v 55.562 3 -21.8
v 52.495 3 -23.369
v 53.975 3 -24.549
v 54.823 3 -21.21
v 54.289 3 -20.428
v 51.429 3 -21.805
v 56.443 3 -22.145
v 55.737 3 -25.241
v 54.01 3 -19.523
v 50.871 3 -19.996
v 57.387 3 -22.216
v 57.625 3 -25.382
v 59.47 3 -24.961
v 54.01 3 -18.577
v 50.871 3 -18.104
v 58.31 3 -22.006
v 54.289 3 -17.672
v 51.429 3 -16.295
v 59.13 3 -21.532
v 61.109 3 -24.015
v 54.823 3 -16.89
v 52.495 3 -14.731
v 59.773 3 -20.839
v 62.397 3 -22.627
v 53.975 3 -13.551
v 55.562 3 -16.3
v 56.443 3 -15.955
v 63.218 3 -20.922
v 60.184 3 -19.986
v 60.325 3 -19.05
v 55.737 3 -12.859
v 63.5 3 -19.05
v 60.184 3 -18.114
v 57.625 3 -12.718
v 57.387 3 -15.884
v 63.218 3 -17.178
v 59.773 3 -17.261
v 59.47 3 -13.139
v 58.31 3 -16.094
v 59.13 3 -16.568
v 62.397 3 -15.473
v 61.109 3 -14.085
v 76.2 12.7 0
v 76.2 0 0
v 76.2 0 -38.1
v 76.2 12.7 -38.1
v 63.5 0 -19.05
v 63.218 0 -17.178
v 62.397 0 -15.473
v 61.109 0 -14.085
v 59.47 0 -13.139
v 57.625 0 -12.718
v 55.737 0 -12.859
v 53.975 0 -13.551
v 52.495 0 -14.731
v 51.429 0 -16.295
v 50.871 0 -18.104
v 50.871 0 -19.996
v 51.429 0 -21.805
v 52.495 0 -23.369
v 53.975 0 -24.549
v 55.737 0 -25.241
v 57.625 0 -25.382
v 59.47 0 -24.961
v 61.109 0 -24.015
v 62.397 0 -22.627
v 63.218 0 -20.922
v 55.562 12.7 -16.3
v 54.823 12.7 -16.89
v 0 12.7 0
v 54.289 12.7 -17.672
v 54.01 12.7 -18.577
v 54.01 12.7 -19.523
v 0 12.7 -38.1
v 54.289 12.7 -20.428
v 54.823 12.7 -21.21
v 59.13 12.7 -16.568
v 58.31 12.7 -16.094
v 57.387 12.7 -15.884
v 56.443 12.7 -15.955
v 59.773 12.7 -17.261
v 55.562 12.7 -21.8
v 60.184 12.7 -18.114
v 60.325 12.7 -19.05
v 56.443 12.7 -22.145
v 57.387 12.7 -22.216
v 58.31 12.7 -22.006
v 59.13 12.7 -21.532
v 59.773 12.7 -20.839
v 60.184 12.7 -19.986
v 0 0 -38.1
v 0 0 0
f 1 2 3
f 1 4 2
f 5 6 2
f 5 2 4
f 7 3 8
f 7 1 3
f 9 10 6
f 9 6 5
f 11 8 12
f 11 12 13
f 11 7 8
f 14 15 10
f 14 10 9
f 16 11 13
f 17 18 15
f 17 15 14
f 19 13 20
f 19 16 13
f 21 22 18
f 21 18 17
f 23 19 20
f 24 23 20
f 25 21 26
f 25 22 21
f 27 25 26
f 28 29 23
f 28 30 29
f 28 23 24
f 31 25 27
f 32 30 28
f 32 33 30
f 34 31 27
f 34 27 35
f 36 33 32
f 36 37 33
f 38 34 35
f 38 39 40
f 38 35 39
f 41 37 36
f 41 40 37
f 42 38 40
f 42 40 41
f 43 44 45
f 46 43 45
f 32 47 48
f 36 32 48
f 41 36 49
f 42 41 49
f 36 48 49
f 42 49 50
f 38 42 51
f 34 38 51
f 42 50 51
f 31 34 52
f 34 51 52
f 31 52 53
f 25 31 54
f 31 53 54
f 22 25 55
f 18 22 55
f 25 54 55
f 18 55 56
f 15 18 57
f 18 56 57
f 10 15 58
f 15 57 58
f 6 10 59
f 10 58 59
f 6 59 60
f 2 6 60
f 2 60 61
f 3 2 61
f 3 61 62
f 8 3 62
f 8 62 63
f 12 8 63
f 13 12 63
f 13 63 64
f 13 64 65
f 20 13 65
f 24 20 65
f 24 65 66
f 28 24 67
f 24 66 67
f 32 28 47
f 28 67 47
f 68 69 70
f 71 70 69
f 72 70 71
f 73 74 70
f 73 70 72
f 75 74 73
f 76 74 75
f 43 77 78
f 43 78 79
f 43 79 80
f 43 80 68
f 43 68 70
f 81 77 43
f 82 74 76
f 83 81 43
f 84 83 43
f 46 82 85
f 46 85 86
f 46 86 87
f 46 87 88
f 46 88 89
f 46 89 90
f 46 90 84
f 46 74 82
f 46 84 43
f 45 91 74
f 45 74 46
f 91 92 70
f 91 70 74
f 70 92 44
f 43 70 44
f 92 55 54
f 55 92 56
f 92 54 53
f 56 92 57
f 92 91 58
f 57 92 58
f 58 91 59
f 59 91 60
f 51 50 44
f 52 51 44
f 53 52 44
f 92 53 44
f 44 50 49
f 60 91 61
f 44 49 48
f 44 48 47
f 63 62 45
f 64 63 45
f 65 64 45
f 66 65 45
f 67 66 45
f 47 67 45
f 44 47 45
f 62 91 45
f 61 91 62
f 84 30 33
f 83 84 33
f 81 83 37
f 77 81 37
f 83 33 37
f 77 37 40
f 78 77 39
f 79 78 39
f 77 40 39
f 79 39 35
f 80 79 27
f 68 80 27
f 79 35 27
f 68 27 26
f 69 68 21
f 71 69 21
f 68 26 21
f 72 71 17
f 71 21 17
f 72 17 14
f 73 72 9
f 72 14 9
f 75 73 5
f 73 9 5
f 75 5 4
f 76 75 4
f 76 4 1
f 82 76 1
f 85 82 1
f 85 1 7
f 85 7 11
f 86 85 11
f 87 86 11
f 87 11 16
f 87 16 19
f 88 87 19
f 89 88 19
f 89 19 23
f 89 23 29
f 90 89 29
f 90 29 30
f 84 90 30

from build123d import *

# Parameters (mm, degrees)
SKETCH1_W           = 76.2
SKETCH1_H           = 38.1
BOSS_EXTRUDE1_DEPTH = 12.7
SKETCH2_R           = 3.175
CUT_EXTRUDE1_DEPTH  = 13.7
SKETCH3_R           = 6.35
CUT_EXTRUDE2_DEPTH  = 3


with BuildPart() as part:
    # Sketch1 → Boss-Extrude1 (new body)
    with BuildSketch(Plane(origin=(0, 0, 0), x_dir=(1, 0, 0), z_dir=(0, 1, 0))):
        with Locations((38.1, 19.05)):
            Rectangle(SKETCH1_W, SKETCH1_H)
    extrude(amount=BOSS_EXTRUDE1_DEPTH)

    # Sketch2 → Cut-Extrude1 (cut, through all)
    with BuildSketch(Plane.XZ):
        with Locations((57.15, -19.05)):
            Circle(SKETCH2_R)
    extrude(amount=-CUT_EXTRUDE1_DEPTH, mode=Mode.SUBTRACT)

    # Sketch3 → Cut-Extrude2 (cut)
    with BuildSketch(Plane.XZ):
        with Locations((57.15, -19.05)):
            Circle(SKETCH3_R)
    extrude(amount=-CUT_EXTRUDE2_DEPTH, mode=Mode.SUBTRACT)


solid = part.part
